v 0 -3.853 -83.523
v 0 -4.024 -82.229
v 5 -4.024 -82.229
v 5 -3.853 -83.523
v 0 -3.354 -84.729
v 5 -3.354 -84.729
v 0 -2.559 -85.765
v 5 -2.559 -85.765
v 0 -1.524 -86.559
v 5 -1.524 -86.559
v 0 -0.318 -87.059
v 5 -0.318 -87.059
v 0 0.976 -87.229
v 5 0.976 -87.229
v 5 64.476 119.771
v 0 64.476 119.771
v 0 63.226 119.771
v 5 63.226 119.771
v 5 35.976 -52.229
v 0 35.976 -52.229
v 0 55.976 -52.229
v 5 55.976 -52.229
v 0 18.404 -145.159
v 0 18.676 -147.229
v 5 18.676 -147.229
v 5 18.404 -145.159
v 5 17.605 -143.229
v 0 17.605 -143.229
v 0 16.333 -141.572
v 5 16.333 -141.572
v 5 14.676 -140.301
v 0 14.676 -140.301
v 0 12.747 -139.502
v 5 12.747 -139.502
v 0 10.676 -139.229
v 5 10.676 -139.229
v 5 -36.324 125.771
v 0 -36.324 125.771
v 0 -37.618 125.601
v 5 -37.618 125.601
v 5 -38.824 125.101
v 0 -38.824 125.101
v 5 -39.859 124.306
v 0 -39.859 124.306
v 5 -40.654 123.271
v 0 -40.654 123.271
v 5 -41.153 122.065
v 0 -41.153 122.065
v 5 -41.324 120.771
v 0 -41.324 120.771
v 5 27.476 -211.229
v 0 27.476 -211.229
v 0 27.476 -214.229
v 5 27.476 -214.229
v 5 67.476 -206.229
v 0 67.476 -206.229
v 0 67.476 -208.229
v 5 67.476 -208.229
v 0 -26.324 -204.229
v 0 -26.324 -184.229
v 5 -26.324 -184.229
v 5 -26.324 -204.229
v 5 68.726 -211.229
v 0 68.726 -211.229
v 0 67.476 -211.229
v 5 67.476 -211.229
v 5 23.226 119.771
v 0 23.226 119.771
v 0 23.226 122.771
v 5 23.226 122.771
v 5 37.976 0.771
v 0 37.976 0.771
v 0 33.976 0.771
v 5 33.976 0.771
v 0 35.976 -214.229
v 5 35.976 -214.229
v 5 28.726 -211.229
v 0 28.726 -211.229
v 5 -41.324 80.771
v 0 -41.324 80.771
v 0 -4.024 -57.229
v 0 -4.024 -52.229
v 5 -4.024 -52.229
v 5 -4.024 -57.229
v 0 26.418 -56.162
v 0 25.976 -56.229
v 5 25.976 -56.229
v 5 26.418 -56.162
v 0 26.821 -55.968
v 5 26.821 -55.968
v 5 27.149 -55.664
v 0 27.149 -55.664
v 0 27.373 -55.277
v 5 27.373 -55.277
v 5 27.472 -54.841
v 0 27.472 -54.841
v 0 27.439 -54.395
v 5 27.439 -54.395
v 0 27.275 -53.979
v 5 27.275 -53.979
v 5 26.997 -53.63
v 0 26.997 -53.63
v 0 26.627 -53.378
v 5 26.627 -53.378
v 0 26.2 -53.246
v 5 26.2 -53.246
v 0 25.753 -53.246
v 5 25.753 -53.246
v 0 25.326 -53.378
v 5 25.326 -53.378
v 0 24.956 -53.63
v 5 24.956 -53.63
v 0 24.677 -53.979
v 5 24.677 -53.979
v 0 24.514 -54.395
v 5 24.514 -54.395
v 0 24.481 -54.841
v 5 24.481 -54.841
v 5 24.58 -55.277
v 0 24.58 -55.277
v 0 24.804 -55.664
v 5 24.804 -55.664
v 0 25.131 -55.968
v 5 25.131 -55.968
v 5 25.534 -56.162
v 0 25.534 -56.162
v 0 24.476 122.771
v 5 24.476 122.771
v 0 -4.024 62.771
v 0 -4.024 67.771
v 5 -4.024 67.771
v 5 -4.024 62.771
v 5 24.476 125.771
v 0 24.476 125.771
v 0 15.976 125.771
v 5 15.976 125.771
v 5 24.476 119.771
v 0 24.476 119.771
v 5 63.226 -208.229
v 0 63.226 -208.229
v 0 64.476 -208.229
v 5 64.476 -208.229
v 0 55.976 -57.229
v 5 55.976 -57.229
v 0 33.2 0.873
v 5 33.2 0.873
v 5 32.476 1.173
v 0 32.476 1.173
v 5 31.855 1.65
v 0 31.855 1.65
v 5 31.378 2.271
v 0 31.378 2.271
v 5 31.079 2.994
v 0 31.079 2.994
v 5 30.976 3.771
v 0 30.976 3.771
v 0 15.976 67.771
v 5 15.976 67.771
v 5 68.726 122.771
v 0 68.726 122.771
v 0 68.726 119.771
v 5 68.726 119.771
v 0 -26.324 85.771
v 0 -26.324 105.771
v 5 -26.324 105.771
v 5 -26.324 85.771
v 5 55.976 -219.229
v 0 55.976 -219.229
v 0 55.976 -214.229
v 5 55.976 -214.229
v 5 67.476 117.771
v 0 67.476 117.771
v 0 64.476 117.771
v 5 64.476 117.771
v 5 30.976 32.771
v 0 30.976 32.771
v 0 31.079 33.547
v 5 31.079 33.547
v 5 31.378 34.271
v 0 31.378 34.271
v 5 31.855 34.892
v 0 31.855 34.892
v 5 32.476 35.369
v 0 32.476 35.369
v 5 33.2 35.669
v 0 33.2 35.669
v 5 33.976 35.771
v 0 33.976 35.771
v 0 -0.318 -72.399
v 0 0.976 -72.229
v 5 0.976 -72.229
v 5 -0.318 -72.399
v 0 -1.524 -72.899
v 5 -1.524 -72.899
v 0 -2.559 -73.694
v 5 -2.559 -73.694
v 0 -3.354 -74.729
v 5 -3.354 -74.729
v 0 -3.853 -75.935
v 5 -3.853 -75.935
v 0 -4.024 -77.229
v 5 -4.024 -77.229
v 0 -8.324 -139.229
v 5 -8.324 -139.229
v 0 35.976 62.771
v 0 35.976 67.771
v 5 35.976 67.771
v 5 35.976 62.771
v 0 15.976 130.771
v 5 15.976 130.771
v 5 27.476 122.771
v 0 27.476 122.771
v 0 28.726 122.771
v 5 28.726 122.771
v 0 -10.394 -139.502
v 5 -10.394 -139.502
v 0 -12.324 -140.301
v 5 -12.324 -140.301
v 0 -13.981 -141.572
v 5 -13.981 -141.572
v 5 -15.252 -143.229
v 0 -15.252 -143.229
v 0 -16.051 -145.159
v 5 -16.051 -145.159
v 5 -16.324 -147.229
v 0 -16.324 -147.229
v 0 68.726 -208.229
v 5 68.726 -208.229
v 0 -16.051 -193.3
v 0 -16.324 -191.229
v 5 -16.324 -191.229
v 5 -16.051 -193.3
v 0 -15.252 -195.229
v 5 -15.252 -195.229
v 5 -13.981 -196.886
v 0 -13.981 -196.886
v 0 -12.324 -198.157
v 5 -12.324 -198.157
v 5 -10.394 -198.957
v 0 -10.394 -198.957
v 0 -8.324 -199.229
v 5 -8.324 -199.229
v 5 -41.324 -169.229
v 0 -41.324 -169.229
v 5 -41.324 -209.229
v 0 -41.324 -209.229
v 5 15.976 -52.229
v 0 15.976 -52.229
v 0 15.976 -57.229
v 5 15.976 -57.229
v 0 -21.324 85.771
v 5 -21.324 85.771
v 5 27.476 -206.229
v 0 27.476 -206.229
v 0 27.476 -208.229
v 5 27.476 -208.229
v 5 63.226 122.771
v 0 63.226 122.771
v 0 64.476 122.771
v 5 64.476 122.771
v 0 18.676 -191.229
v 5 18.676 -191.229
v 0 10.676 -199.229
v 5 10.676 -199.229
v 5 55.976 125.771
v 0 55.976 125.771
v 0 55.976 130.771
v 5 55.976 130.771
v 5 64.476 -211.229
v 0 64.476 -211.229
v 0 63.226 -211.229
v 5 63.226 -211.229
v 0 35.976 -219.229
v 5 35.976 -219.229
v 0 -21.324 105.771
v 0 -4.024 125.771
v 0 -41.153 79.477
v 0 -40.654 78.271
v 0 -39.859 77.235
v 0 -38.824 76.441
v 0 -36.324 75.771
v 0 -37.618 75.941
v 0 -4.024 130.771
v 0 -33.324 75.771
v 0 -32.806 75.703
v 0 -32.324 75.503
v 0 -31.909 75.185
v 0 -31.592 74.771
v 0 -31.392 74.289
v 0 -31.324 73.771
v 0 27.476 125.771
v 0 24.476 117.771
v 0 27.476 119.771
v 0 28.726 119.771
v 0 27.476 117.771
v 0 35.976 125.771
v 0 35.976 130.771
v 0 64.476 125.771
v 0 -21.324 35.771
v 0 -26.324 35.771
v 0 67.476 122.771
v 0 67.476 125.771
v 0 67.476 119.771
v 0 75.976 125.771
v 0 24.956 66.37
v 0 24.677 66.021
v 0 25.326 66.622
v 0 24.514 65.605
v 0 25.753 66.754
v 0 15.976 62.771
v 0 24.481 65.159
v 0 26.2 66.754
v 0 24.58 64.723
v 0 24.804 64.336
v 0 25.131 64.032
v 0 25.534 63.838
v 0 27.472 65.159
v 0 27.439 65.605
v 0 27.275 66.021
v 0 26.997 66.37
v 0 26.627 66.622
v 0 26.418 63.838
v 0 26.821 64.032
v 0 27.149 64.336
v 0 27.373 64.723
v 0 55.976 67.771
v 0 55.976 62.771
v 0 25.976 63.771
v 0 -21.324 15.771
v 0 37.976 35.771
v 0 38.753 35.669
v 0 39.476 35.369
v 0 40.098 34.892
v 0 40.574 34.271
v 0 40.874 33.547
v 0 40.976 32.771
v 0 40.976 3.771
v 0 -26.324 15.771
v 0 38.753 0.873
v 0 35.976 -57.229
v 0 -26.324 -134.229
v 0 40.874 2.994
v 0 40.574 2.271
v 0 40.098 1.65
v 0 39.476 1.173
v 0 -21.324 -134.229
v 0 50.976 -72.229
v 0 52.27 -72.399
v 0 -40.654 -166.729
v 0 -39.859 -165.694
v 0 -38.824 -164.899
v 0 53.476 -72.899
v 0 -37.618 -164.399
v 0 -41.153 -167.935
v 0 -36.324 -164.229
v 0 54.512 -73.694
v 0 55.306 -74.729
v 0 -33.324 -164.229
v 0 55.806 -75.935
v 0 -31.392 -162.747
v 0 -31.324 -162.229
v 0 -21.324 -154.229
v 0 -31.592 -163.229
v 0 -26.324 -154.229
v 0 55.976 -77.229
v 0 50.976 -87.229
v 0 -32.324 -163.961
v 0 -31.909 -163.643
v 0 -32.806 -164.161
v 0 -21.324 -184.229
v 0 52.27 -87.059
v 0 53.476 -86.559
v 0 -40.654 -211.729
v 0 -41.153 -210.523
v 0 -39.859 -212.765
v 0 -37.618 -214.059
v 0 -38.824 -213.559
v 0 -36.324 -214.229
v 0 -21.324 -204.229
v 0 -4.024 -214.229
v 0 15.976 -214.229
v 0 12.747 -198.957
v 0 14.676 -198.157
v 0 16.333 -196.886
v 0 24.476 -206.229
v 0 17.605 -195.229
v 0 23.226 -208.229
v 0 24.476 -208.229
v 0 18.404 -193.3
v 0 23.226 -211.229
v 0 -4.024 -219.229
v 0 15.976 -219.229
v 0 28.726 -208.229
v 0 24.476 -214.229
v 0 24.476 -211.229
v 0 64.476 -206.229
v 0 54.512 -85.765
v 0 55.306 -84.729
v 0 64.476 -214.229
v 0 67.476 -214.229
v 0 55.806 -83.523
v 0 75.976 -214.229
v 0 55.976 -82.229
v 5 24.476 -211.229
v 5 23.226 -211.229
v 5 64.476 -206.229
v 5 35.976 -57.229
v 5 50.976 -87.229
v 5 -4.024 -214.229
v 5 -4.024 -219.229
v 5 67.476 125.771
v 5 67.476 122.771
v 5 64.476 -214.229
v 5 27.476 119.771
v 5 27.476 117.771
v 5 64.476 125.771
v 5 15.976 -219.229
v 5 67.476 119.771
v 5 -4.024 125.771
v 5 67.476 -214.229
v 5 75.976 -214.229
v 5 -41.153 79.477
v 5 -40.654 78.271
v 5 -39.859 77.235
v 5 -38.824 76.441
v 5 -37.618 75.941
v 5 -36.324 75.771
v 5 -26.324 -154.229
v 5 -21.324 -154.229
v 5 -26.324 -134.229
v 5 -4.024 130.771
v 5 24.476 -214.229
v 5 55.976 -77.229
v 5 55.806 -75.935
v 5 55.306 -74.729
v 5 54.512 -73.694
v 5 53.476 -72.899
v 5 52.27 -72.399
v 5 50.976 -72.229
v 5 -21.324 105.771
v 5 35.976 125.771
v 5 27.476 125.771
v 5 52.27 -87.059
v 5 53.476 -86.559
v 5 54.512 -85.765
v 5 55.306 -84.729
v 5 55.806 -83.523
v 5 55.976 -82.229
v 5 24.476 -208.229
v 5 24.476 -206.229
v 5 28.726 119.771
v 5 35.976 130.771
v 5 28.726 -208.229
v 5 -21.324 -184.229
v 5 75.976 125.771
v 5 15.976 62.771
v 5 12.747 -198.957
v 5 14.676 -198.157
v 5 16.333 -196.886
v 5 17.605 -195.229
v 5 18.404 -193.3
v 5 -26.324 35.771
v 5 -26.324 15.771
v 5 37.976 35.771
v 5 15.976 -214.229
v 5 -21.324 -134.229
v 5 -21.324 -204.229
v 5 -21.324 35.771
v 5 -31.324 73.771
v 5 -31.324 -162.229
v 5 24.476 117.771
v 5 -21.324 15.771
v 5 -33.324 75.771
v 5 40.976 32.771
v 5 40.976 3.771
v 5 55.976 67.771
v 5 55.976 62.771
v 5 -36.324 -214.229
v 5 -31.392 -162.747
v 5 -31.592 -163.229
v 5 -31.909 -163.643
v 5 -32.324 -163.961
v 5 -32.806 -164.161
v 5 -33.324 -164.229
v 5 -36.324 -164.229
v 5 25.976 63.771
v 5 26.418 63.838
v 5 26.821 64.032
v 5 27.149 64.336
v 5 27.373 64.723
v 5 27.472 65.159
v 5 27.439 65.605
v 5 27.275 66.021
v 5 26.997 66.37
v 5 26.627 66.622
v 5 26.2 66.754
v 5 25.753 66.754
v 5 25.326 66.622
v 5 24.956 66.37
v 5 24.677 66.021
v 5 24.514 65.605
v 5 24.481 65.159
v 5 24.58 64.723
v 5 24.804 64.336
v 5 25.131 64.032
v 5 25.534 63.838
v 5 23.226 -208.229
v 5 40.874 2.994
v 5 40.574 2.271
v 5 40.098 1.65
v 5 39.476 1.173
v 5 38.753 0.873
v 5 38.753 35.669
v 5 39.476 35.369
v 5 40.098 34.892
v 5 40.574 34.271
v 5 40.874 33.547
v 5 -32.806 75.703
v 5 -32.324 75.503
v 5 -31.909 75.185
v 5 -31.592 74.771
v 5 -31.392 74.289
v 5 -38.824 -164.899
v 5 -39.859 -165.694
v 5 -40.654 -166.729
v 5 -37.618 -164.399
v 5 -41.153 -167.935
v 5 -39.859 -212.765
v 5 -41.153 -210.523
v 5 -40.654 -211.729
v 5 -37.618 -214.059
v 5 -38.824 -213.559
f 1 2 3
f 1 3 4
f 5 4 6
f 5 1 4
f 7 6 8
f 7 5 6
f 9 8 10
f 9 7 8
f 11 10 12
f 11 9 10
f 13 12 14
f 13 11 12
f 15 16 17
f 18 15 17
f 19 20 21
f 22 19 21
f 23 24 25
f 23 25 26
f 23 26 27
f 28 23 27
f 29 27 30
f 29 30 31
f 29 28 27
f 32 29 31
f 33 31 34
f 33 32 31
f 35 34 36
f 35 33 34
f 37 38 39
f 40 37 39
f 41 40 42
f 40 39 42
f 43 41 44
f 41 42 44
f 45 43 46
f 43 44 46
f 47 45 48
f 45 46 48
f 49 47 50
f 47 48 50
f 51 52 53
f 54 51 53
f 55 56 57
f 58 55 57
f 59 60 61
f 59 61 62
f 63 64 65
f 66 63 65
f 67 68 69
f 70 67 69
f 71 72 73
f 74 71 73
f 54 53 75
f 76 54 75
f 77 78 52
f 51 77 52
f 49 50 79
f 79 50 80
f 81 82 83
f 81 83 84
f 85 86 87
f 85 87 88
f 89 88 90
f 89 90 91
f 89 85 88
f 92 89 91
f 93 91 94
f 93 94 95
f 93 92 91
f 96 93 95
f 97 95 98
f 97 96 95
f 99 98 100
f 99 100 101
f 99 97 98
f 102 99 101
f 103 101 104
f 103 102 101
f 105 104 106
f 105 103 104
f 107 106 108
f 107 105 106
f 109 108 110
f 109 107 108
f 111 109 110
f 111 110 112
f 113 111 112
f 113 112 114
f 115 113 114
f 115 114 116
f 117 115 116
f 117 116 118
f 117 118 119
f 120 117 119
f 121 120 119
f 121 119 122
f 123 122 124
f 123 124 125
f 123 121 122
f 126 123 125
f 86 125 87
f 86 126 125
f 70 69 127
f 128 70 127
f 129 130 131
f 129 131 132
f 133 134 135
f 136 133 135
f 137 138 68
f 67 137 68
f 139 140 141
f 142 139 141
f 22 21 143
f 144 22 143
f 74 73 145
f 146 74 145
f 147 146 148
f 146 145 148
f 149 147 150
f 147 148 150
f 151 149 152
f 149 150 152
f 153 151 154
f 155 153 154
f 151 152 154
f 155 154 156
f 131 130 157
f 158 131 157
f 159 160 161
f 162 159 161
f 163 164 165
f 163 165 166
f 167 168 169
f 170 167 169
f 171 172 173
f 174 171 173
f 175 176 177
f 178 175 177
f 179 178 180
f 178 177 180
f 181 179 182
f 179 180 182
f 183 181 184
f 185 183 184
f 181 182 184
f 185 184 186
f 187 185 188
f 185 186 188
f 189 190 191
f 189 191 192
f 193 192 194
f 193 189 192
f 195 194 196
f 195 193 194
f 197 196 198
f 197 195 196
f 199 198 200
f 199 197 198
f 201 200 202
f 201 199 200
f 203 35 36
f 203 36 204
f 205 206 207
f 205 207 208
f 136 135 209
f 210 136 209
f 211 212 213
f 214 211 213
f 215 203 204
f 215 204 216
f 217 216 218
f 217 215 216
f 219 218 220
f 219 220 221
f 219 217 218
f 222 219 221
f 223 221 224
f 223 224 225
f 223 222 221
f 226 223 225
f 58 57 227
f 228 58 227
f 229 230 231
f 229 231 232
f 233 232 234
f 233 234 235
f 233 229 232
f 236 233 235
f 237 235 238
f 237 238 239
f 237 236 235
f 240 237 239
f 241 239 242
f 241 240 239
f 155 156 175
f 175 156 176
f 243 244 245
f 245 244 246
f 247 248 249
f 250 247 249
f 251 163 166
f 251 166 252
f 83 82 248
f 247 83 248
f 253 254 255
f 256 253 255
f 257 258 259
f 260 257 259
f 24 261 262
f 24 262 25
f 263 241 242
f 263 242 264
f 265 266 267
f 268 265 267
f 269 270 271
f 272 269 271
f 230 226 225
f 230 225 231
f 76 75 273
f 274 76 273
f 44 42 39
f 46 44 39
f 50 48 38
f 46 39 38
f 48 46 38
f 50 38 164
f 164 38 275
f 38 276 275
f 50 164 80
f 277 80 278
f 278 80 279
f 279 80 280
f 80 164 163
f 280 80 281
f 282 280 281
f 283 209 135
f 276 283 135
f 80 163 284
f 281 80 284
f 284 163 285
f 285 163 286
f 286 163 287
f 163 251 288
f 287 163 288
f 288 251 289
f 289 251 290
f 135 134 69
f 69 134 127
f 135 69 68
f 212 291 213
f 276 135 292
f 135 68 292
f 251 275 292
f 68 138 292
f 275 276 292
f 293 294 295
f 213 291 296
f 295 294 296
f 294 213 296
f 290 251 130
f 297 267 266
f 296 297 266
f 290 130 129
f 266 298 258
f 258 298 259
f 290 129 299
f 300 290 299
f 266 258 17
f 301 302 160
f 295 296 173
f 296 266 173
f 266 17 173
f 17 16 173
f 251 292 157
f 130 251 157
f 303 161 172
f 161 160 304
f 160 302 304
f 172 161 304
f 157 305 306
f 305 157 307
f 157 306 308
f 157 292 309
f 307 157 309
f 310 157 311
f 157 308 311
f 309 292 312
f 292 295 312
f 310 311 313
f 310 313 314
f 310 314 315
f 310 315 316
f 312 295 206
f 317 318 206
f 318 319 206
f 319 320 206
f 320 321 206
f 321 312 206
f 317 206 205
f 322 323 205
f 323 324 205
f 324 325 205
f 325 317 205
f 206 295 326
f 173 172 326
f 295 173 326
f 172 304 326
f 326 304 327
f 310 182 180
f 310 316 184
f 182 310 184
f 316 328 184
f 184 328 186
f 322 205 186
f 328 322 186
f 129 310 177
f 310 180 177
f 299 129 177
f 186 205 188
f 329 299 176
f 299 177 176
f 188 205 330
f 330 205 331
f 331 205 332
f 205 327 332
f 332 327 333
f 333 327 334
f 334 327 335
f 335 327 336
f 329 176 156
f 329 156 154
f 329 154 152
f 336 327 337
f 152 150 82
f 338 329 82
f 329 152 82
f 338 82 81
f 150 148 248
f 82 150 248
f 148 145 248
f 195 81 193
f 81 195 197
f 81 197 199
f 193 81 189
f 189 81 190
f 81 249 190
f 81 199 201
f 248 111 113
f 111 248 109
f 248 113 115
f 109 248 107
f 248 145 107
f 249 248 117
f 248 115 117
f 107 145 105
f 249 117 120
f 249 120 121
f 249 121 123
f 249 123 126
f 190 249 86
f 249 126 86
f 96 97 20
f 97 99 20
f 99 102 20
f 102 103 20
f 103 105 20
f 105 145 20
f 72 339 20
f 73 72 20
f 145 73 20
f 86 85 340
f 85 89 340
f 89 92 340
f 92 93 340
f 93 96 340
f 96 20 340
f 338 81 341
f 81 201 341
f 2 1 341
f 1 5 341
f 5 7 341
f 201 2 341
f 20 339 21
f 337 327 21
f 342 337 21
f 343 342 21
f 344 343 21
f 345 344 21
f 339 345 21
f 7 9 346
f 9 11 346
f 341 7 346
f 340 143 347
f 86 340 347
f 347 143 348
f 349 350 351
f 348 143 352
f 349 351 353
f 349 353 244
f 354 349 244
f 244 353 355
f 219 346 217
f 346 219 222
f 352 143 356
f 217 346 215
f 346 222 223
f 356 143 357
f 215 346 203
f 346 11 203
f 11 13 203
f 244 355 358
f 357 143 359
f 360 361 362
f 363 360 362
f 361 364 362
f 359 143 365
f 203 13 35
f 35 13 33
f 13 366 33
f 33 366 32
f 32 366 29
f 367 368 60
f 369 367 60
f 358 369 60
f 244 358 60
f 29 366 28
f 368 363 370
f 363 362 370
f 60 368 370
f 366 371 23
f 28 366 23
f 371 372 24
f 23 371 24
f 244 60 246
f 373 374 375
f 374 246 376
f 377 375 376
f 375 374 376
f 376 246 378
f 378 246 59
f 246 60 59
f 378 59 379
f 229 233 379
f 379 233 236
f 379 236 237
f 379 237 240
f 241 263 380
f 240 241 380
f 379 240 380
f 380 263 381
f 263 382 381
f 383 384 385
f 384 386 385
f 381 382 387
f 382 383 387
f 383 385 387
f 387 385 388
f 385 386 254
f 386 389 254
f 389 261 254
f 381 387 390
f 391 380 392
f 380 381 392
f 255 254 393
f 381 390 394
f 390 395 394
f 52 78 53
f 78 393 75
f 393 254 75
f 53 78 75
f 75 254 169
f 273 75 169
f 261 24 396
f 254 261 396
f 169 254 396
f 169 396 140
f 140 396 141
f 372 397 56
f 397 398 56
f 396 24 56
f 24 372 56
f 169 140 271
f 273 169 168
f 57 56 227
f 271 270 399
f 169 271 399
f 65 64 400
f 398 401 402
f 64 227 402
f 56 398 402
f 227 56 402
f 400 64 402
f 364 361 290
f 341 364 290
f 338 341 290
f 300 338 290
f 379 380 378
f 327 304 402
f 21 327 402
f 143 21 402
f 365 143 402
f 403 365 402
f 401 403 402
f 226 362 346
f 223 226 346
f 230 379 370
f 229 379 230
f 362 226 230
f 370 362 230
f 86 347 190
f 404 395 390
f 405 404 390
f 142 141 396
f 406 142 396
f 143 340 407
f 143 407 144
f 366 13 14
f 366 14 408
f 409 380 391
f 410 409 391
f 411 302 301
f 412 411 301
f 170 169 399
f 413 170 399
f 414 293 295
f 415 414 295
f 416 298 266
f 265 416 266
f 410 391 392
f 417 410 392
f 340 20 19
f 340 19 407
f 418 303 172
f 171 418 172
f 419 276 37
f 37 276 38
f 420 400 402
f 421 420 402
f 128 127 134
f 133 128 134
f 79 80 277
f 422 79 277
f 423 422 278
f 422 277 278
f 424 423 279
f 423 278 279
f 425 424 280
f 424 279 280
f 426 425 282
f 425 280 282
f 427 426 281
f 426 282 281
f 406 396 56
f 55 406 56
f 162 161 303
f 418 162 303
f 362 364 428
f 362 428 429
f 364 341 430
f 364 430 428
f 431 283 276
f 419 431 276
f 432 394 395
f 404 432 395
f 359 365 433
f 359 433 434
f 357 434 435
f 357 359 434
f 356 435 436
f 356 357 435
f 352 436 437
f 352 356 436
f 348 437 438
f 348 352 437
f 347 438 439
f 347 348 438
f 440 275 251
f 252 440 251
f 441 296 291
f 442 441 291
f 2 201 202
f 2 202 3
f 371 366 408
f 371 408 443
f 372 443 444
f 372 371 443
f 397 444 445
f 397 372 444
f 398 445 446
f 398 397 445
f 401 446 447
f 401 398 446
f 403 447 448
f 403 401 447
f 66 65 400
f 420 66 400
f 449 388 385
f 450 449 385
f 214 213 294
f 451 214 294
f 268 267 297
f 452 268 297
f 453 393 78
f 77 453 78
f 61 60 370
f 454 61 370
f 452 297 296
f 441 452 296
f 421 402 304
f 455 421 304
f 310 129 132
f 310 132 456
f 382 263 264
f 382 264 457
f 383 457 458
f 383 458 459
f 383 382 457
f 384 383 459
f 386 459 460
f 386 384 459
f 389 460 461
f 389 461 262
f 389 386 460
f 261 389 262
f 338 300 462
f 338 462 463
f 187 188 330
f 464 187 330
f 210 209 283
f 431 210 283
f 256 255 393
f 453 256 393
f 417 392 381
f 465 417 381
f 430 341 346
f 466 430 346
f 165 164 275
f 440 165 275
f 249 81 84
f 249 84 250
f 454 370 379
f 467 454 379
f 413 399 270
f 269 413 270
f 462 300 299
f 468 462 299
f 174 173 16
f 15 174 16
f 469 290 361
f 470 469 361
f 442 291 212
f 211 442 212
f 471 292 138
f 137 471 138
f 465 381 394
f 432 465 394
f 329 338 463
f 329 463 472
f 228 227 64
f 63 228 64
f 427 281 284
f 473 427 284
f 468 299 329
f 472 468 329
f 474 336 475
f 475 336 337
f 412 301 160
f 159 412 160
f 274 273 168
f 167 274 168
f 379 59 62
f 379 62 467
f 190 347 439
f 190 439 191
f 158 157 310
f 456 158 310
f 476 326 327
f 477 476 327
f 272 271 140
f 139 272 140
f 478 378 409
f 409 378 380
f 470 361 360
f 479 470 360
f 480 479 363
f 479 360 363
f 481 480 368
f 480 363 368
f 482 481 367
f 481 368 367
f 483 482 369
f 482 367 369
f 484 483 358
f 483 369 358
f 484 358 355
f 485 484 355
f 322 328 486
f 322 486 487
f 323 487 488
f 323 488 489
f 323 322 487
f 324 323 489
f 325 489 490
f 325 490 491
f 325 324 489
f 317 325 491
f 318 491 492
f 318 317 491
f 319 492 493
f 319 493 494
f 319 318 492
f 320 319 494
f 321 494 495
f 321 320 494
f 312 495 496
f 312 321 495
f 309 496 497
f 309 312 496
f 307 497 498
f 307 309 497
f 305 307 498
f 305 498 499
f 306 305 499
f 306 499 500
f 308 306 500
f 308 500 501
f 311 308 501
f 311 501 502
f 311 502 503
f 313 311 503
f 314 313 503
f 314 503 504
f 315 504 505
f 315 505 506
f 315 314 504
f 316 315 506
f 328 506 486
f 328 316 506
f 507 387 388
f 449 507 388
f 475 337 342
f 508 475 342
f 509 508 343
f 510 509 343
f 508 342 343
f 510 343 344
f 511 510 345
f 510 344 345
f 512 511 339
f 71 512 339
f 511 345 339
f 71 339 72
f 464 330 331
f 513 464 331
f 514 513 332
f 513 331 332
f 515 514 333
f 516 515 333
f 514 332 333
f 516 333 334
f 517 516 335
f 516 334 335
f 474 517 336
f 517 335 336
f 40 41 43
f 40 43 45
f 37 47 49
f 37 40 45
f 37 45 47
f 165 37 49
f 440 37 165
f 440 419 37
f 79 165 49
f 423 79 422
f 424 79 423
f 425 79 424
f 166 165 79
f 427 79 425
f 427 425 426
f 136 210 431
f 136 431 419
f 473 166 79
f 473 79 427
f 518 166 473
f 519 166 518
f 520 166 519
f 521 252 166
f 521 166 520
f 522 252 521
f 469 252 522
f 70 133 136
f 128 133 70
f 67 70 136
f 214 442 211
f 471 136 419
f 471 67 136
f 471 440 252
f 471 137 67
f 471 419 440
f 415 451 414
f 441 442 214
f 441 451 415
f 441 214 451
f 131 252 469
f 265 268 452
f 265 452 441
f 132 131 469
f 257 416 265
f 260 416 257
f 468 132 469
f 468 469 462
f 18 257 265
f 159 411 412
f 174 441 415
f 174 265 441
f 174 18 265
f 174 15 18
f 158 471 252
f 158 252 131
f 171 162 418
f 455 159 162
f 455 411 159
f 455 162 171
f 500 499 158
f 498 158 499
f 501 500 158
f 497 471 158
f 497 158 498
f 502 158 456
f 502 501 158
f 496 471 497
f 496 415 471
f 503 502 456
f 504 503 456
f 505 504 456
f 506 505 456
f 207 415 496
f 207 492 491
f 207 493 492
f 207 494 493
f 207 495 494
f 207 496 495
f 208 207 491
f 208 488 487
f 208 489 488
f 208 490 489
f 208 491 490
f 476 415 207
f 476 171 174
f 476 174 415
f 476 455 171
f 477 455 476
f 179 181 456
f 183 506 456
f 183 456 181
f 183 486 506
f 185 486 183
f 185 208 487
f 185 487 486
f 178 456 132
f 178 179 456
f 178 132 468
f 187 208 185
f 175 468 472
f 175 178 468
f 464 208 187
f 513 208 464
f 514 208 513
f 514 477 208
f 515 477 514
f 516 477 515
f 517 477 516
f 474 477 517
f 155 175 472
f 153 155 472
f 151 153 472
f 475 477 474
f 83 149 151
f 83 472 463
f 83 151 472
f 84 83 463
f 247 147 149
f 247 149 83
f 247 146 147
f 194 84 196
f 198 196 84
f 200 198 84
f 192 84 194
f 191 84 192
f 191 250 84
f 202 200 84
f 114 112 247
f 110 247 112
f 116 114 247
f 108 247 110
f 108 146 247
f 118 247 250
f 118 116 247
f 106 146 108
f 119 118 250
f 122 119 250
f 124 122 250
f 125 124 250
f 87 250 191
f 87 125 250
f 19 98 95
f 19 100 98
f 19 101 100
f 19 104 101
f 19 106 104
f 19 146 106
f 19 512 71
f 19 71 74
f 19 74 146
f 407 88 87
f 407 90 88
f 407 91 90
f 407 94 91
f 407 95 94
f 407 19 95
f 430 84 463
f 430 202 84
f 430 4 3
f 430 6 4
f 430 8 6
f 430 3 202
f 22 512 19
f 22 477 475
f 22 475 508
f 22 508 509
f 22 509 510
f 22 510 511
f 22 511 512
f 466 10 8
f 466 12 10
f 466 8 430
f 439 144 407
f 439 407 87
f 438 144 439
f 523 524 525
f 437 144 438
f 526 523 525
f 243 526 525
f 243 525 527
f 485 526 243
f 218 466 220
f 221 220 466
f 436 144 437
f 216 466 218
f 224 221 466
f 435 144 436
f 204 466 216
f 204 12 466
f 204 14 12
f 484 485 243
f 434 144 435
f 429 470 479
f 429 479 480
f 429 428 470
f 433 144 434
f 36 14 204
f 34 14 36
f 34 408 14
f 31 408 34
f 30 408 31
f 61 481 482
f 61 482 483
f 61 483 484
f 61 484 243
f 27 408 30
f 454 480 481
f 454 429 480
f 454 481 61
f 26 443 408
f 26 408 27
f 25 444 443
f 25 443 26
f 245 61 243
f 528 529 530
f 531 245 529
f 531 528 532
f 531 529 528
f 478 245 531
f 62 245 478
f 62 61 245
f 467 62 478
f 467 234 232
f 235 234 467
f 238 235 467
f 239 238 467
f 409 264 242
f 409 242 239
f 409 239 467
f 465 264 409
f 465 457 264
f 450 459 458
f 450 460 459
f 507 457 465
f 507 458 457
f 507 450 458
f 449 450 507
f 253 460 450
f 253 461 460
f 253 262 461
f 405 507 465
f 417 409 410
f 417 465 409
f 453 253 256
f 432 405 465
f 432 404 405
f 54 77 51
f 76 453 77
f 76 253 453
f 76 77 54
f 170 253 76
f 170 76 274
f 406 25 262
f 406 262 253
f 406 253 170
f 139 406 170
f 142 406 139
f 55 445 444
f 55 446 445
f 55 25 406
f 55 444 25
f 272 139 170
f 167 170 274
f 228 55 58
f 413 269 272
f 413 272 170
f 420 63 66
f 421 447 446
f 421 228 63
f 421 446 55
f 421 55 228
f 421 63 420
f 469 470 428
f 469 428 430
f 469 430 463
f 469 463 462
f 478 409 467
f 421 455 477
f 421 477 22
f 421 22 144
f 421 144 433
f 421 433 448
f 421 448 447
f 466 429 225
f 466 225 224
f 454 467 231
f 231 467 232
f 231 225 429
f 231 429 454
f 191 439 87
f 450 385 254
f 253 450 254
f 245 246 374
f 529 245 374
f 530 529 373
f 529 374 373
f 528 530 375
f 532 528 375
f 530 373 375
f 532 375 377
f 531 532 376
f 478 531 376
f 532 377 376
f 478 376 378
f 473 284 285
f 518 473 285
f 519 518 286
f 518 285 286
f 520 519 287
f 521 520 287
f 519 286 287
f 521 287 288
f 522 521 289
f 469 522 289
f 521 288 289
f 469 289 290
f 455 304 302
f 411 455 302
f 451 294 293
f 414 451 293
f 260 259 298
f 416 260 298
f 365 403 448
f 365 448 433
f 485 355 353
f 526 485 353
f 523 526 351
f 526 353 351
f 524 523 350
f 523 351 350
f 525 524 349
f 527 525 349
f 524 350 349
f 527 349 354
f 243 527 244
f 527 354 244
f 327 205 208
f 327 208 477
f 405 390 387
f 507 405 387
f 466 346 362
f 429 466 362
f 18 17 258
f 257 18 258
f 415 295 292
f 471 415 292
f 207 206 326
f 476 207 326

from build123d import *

# Parameters (mm, degrees)
SKETCH_1_R      = 1.5
SKETCH_1_W      = 5
SKETCH_1_H      = 20
SKETCH_1_W_2    = 20
SKETCH_1_H_2    = 5
EXTRUDE_1_DEPTH = 5


with BuildPart() as part:
    # 草图1 → 凸台-拉伸1 (new body)
    with BuildSketch(Plane(origin=(0, 0, 0), x_dir=(0, 0, -1), z_dir=(1, 0, 0))):
        with BuildLine():
            Line((-75.770893239, -36.323671614), (-75.770893239, -33.323671614))
            ThreePointArc((-75.770893239, -33.323671614), (-75.185106801, -31.909458051), (-73.770893239, -31.323671614))
            Line((-73.770893239, -31.323671614), (162.229106761, -31.323671614))
            ThreePointArc((162.229106761, -31.323671614), (163.643320323, -31.909458051), (164.229106761, -33.323671614))
            Line((164.229106761, -33.323671614), (164.229106761, -36.323671614))
            ThreePointArc((164.229106761, -36.323671614), (165.693572855, -39.85920552), (169.229106761, -41.323671614))
            Line((169.229106761, -41.323671614), (209.229106761, -41.323671614))
            ThreePointArc((209.229106761, -41.323671614), (212.764640667, -39.85920552), (214.229106761, -36.323671614))
            Line((214.229106761, -36.323671614), (214.229106761, -4.023671614))
            Line((214.229106761, -4.023671614), (219.229106761, -4.023671614))
            Line((219.229106761, -4.023671614), (219.229106761, 15.976328386))
            Line((219.229106761, 15.976328386), (214.229106761, 15.976328386))
            Line((214.229106761, 15.976328386), (214.229106761, 24.476328386))
            Line((214.229106761, 24.476328386), (211.229106761, 24.476328386))
            Line((211.229106761, 24.476328386), (211.229106761, 23.226328386))
            Line((211.229106761, 23.226328386), (208.229106761, 23.226328386))
            Line((208.229106761, 23.226328386), (208.229106761, 24.476328386))
            Line((208.229106761, 24.476328386), (206.229106761, 24.476328386))
            Line((206.229106761, 24.476328386), (206.229106761, 27.476328386))
            Line((206.229106761, 27.476328386), (208.229106761, 27.476328386))
            Line((208.229106761, 27.476328386), (208.229106761, 28.726328386))
            Line((208.229106761, 28.726328386), (211.229106761, 28.726328386))
            Line((211.229106761, 28.726328386), (211.229106761, 27.476328386))
            Line((211.229106761, 27.476328386), (214.229106761, 27.476328386))
            Line((214.229106761, 27.476328386), (214.229106761, 35.976328386))
            Line((214.229106761, 35.976328386), (219.229106761, 35.976328386))
            Line((219.229106761, 35.976328386), (219.229106761, 55.976328386))
            Line((219.229106761, 55.976328386), (214.229106761, 55.976328386))
            Line((214.229106761, 55.976328386), (214.229106761, 64.476328386))
            Line((214.229106761, 64.476328386), (211.229106761, 64.476328386))
            Line((211.229106761, 64.476328386), (211.229106761, 63.226328386))
            Line((211.229106761, 63.226328386), (208.229106761, 63.226328386))
            Line((208.229106761, 63.226328386), (208.229106761, 64.476328386))
            Line((208.229106761, 64.476328386), (206.229106761, 64.476328386))
            Line((206.229106761, 64.476328386), (206.229106761, 67.476328386))
            Line((206.229106761, 67.476328386), (208.229106761, 67.476328386))
            Line((208.229106761, 67.476328386), (208.229106761, 68.726328386))
            Line((208.229106761, 68.726328386), (211.229106761, 68.726328386))
            Line((211.229106761, 68.726328386), (211.229106761, 67.476328386))
            Line((211.229106761, 67.476328386), (214.229106761, 67.476328386))
            Line((214.229106761, 67.476328386), (214.229106761, 75.976328386))
            Line((214.229106761, 75.976328386), (-125.770893239, 75.976328386))
            Line((-125.770893239, 75.976328386), (-125.770893239, 67.476328386))
            Line((-125.770893239, 67.476328386), (-122.770893239, 67.476328386))
            Line((-122.770893239, 67.476328386), (-122.770893239, 68.726328386))
            Line((-122.770893239, 68.726328386), (-119.770893239, 68.726328386))
            Line((-119.770893239, 68.726328386), (-119.770893239, 67.476328386))
            Line((-119.770893239, 67.476328386), (-117.770893239, 67.476328386))
            Line((-117.770893239, 67.476328386), (-117.770893239, 64.476328386))
            Line((-117.770893239, 64.476328386), (-119.770893239, 64.476328386))
            Line((-119.770893239, 64.476328386), (-119.770893239, 63.226328386))
            Line((-119.770893239, 63.226328386), (-122.770893239, 63.226328386))
            Line((-122.770893239, 63.226328386), (-122.770893239, 64.476328386))
            Line((-122.770893239, 64.476328386), (-125.770893239, 64.476328386))
            Line((-125.770893239, 64.476328386), (-125.770893239, 55.976328386))
            Line((-125.770893239, 55.976328386), (-130.770893239, 55.976328386))
            Line((-130.770893239, 55.976328386), (-130.770893239, 35.976328386))
            Line((-130.770893239, 35.976328386), (-125.770893239, 35.976328386))
            Line((-125.770893239, 35.976328386), (-125.770893239, 27.476328386))
            Line((-125.770893239, 27.476328386), (-122.770893239, 27.476328386))
            Line((-122.770893239, 27.476328386), (-122.770893239, 28.726328386))
            Line((-122.770893239, 28.726328386), (-119.770893239, 28.726328386))
            Line((-119.770893239, 28.726328386), (-119.770893239, 27.476328386))
            Line((-119.770893239, 27.476328386), (-117.770893239, 27.476328386))
            Line((-117.770893239, 27.476328386), (-117.770893239, 24.476328386))
            Line((-117.770893239, 24.476328386), (-119.770893239, 24.476328386))
            Line((-119.770893239, 24.476328386), (-119.770893239, 23.226328386))
            Line((-119.770893239, 23.226328386), (-122.770893239, 23.226328386))
            Line((-122.770893239, 23.226328386), (-122.770893239, 24.476328386))
            Line((-122.770893239, 24.476328386), (-125.770893239, 24.476328386))
            Line((-125.770893239, 24.476328386), (-125.770893239, 15.976328386))
            Line((-125.770893239, 15.976328386), (-130.770893239, 15.976328386))
            Line((-130.770893239, 15.976328386), (-130.770893239, -4.023671614))
            Line((-130.770893239, -4.023671614), (-125.770893239, -4.023671614))
            Line((-125.770893239, -4.023671614), (-125.770893239, -36.323671614))
            ThreePointArc((-125.770893239, -36.323671614), (-124.306427145, -39.85920552), (-120.770893239, -41.323671614))
            Line((-120.770893239, -41.323671614), (-80.770893239, -41.323671614))
            ThreePointArc((-80.770893239, -41.323671614), (-77.235359333, -39.85920552), (-75.770893239, -36.323671614))
        make_face()
        with Locations((54.729106761, 25.976328386)):
            Circle(SKETCH_1_R, mode=Mode.SUBTRACT)
        with Locations((-65.270893239, 25.976328386)):
            Circle(SKETCH_1_R, mode=Mode.SUBTRACT)
        with Locations((54.729106761, 45.976328386)):
            Rectangle(SKETCH_1_W, SKETCH_1_H, mode=Mode.SUBTRACT)
        with Locations((54.729106761, 5.976328386)):
            Rectangle(SKETCH_1_W, SKETCH_1_H, mode=Mode.SUBTRACT)
        with Locations((-65.270893239, 45.976328386)):
            Rectangle(SKETCH_1_W, SKETCH_1_H, mode=Mode.SUBTRACT)
        with Locations((-65.270893239, 5.976328386)):
            Rectangle(SKETCH_1_W, SKETCH_1_H, mode=Mode.SUBTRACT)
        with Locations((-25.770893239, -23.823671614)):
            Rectangle(SKETCH_1_W_2, SKETCH_1_H_2, mode=Mode.SUBTRACT)
        with Locations((-95.770893239, -23.823671614)):
            Rectangle(SKETCH_1_W_2, SKETCH_1_H_2, mode=Mode.SUBTRACT)
        with Locations((194.229106761, -23.823671614)):
            Rectangle(SKETCH_1_W_2, SKETCH_1_H_2, mode=Mode.SUBTRACT)
        with Locations((144.229106761, -23.823671614)):
            Rectangle(SKETCH_1_W_2, SKETCH_1_H_2, mode=Mode.SUBTRACT)
        with BuildLine():
            Line((191.229106761, 18.676328386), (147.229106761, 18.676328386))
            ThreePointArc((147.229106761, 18.676328386), (141.572252511, 16.333182636), (139.229106761, 10.676328386))
            Line((139.229106761, 10.676328386), (139.229106761, -8.323671614))
            ThreePointArc((139.229106761, -8.323671614), (141.572252511, -13.980525863), (147.229106761, -16.323671614))
            Line((147.229106761, -16.323671614), (191.229106761, -16.323671614))
            ThreePointArc((191.229106761, -16.323671614), (196.88596101, -13.980525863), (199.229106761, -8.323671614))
            Line((199.229106761, -8.323671614), (199.229106761, 10.676328386))
            ThreePointArc((199.229106761, 10.676328386), (196.88596101, 16.333182636), (191.229106761, 18.676328386))
        make_face(mode=Mode.SUBTRACT)
        with BuildLine():
            Line((82.229106761, 55.976328386), (77.229106761, 55.976328386))
            ThreePointArc((77.229106761, 55.976328386), (73.693572855, 54.511862292), (72.229106761, 50.976328386))
            Line((72.229106761, 50.976328386), (72.229106761, 0.976328386))
            ThreePointArc((72.229106761, 0.976328386), (73.693572855, -2.55920552), (77.229106761, -4.023671614))
            Line((77.229106761, -4.023671614), (82.229106761, -4.023671614))
            ThreePointArc((82.229106761, -4.023671614), (85.764640667, -2.55920552), (87.229106761, 0.976328386))
            Line((87.229106761, 0.976328386), (87.229106761, 50.976328386))
            ThreePointArc((87.229106761, 50.976328386), (85.764640667, 54.511862292), (82.229106761, 55.976328386))
        make_face(mode=Mode.SUBTRACT)
        with BuildLine():
            Line((-32.770893239, 40.976328386), (-3.770893239, 40.976328386))
            ThreePointArc((-3.770893239, 40.976328386), (-1.649572896, 40.09764873), (-0.770893239, 37.976328386))
            Line((-0.770893239, 37.976328386), (-0.770893239, 33.976328386))
            ThreePointArc((-0.770893239, 33.976328386), (-1.649572896, 31.855008043), (-3.770893239, 30.976328386))
            Line((-3.770893239, 30.976328386), (-32.770893239, 30.976328386))
            ThreePointArc((-32.770893239, 30.976328386), (-34.892213583, 31.855008043), (-35.770893239, 33.976328386))
            Line((-35.770893239, 33.976328386), (-35.770893239, 37.976328386))
            ThreePointArc((-35.770893239, 37.976328386), (-34.892213583, 40.09764873), (-32.770893239, 40.976328386))
        make_face(mode=Mode.SUBTRACT)
    extrude(amount=EXTRUDE_1_DEPTH)


solid = part.part
